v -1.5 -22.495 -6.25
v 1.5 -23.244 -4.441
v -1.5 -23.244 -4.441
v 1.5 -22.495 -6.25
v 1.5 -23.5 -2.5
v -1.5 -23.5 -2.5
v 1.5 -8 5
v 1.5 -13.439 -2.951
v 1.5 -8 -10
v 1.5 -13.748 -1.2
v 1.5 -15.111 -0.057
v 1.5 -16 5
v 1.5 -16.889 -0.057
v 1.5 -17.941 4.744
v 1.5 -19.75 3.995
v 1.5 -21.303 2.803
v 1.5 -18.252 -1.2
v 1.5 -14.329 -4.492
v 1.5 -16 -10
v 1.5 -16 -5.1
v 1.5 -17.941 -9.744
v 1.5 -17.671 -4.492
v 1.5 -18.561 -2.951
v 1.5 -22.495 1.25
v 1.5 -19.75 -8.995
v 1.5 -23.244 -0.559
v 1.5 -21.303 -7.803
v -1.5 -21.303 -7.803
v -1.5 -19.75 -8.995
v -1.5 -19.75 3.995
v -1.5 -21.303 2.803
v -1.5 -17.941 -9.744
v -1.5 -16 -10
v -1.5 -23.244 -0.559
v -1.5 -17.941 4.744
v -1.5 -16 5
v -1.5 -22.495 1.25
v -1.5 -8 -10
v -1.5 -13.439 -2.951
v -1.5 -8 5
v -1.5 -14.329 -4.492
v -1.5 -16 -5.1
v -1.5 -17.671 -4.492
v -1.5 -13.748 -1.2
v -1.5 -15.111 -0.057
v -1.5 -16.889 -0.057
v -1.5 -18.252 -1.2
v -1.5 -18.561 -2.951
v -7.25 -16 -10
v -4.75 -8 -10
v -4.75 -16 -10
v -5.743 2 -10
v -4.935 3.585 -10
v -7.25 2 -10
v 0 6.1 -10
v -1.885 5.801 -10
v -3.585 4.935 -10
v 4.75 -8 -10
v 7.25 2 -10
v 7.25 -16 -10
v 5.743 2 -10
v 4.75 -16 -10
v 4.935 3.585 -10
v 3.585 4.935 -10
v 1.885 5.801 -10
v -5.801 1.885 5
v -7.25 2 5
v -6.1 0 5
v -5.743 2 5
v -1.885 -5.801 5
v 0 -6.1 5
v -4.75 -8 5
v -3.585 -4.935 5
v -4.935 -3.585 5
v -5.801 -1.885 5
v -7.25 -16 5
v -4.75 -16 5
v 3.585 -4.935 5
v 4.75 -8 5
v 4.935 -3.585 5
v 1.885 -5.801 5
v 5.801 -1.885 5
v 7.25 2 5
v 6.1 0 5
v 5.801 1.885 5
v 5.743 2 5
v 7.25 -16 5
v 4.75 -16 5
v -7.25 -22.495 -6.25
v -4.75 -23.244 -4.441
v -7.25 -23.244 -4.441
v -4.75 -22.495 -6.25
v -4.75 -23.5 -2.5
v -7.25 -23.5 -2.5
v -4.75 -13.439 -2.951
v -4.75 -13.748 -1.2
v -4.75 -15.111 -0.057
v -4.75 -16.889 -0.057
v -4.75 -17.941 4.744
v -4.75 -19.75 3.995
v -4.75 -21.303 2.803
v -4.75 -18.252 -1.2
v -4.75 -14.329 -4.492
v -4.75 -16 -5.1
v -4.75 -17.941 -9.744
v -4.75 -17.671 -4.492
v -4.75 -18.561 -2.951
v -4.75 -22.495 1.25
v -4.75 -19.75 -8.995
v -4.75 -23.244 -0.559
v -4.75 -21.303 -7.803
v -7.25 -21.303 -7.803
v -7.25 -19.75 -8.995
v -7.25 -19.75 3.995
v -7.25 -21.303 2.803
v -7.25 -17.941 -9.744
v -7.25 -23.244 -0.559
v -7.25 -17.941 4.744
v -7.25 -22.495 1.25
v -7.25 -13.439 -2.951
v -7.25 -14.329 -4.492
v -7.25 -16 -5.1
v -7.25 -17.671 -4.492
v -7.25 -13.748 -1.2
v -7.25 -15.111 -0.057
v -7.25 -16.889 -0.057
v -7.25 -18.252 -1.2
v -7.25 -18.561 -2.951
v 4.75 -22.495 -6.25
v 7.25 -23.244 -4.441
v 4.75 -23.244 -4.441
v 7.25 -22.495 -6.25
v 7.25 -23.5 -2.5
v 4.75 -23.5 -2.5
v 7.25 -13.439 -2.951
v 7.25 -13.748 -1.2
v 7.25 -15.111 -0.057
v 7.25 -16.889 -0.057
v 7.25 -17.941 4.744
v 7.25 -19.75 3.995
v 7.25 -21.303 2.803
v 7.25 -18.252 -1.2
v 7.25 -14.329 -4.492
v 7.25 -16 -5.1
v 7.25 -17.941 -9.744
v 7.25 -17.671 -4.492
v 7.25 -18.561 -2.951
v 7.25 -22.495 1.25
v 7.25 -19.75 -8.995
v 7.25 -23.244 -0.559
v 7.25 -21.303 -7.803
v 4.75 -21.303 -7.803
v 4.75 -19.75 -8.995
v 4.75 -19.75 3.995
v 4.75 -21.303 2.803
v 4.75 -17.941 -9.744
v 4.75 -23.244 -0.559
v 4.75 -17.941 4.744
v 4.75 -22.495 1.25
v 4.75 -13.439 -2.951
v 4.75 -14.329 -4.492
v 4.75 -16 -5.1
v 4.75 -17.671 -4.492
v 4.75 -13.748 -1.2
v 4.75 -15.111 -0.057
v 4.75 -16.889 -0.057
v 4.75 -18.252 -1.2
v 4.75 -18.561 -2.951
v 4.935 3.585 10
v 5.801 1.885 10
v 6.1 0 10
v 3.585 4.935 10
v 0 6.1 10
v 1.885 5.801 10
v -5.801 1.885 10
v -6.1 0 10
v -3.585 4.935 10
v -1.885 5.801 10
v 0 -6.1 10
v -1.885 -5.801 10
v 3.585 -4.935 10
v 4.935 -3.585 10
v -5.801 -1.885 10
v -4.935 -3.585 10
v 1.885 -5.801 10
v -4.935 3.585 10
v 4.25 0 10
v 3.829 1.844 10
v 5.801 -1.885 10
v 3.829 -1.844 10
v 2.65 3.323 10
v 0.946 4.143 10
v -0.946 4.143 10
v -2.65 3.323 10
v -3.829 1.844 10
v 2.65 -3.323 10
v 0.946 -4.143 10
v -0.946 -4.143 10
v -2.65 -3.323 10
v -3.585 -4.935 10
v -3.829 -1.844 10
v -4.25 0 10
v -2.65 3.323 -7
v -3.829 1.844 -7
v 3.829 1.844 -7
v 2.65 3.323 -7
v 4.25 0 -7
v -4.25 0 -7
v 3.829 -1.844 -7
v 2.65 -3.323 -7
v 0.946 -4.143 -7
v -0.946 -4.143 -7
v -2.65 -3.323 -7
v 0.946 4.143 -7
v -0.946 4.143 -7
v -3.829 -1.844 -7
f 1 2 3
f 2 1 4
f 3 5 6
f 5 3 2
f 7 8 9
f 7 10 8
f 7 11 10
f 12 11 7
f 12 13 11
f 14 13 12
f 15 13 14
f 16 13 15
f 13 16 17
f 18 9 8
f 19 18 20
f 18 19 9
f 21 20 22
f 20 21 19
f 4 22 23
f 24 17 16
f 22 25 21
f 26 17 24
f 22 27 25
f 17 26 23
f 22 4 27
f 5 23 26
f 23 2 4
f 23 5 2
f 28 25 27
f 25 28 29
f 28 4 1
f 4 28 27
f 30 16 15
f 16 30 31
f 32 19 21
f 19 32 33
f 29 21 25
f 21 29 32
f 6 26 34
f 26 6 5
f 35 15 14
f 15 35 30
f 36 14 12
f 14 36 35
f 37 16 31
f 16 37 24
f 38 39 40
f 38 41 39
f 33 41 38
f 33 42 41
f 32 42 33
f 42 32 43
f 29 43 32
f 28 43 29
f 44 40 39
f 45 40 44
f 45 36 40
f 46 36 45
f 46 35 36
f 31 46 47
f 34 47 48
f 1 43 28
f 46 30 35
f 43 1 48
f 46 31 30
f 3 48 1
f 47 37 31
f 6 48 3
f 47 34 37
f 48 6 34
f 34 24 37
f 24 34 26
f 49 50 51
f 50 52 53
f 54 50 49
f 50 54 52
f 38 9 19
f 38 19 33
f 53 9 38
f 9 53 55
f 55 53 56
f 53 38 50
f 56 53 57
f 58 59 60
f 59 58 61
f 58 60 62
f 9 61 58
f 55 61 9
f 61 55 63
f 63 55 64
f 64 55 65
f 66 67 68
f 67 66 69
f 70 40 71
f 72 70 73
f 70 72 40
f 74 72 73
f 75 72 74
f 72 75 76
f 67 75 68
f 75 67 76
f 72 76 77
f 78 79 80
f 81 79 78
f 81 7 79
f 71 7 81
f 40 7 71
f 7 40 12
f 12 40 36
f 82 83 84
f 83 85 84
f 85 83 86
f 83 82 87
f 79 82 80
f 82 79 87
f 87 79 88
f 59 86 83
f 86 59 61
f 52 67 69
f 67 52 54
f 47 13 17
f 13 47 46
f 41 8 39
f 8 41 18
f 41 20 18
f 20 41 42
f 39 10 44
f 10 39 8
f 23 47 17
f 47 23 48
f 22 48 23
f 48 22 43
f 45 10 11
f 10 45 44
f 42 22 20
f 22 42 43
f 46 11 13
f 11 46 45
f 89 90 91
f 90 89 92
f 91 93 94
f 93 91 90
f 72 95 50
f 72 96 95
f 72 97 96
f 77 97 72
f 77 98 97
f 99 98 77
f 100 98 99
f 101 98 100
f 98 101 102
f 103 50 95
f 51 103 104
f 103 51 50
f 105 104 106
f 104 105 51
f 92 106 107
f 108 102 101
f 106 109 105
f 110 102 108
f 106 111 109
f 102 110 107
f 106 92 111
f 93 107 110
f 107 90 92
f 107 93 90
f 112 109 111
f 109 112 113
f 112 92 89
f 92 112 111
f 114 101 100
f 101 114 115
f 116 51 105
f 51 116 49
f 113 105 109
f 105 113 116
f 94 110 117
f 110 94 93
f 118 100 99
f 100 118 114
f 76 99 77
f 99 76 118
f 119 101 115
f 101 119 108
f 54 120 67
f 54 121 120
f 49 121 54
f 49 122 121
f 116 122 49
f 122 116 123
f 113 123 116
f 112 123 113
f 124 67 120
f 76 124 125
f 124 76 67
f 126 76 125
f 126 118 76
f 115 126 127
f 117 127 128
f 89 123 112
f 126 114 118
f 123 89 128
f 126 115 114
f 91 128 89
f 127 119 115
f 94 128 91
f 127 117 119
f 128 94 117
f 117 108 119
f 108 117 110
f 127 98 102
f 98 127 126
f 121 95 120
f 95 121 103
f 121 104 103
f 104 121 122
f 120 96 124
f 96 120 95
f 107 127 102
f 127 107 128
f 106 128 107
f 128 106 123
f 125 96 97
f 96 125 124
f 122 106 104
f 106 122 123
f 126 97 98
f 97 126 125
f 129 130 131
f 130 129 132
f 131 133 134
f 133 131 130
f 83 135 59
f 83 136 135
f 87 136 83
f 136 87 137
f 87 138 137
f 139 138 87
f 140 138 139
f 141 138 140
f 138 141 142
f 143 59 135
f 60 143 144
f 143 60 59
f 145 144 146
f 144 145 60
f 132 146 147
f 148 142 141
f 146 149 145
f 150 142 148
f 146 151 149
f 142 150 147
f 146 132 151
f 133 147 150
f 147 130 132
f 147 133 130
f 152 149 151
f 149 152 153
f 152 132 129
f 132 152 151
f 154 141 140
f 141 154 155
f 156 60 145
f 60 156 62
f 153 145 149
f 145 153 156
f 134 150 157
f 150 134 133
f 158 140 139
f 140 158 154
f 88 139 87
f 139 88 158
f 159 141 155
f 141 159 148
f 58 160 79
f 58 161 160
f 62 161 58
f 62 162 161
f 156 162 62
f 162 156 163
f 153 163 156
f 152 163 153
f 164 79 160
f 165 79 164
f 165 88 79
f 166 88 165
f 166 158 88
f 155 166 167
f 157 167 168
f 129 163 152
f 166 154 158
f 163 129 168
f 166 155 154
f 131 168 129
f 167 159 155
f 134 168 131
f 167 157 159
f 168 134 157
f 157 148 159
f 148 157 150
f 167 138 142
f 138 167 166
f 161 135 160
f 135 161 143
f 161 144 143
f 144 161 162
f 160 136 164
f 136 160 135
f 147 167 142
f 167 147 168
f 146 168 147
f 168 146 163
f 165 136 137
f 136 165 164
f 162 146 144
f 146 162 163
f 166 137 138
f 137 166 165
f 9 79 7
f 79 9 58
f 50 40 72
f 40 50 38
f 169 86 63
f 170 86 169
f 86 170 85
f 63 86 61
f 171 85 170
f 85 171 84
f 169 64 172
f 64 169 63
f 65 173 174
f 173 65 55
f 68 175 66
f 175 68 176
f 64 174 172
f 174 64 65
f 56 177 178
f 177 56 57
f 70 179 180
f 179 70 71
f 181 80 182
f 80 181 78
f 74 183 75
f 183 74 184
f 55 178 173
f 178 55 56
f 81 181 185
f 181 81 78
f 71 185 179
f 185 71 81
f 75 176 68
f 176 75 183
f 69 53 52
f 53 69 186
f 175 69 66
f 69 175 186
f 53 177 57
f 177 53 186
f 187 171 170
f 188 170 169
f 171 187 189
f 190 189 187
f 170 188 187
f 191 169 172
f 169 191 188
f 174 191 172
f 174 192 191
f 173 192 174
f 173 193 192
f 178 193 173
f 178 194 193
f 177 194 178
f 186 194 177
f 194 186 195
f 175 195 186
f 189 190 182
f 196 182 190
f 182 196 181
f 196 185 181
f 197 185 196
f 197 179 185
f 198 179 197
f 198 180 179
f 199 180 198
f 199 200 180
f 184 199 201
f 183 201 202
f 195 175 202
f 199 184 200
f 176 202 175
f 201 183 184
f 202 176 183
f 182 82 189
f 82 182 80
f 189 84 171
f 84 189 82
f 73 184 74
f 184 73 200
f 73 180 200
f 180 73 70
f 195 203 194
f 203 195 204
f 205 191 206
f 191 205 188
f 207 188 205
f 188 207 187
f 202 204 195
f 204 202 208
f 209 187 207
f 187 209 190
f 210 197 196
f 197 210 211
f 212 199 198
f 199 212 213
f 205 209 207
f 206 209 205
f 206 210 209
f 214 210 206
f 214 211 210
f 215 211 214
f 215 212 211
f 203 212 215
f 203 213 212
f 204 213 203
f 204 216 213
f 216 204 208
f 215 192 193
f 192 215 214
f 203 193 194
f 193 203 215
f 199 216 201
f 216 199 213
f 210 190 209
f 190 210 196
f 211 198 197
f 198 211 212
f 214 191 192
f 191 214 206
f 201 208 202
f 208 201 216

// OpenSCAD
/*
 * Written by Dermot Tynan, Kalopa Research.
 * GPLv2.
 *
 * All dimensions are in mm.
 */
module leaf(w)
{
	rotate(a = [0, 90, 0]) {
		difference() {
			union() {
				cylinder(r = 7.5, h = w, center = true);
				translate([0, 9, 0]) cube([15, 18, w], center = true);
			}
			cylinder(r = 2.6, h = 4, center = true);
		}
	}
}

module gopro_mount()
{
	union() {
		leaf(3.0);
		translate([-6, 0, 0]) leaf(2.5);
		translate([6, 0, 0]) leaf(2.5);
		translate([0, 13, 0]) cube([14, 10, 15], center = true);
	}
}

module shaft_mount()
{
	difference() {
		union() {
			cylinder(r = 6.1, h = 20, center = true);
			translate([0, -16, -2.5]) gopro_mount();
		}
		translate([0, 0, 3]) cylinder(r = 4.25, h = 20, center = true);
	}
}

shaft_mount();
